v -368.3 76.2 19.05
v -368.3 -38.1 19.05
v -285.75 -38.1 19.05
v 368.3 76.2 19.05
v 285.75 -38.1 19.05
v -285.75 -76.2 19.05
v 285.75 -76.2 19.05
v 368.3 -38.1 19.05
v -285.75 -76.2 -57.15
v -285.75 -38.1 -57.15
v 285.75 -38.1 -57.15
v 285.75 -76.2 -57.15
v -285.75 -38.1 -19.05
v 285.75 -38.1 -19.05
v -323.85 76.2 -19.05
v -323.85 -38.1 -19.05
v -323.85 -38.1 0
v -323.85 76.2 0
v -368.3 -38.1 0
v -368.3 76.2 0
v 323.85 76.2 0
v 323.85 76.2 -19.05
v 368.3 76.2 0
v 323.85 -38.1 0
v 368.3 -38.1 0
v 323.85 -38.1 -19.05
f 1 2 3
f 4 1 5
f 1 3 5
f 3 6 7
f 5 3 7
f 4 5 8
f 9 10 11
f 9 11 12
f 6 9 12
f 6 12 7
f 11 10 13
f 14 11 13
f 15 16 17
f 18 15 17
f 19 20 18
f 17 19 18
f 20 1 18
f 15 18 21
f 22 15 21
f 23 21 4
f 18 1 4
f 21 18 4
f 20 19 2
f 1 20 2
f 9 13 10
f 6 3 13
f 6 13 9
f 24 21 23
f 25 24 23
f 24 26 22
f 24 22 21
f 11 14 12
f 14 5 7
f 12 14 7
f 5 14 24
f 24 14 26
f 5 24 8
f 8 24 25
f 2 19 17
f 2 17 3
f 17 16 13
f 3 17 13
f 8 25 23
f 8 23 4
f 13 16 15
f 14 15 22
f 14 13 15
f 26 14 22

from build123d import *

# Parameters (mm, degrees)
F0_W     = 736.6
F0_H     = 38.1
F1_DEPTH = 76.2
F2_W     = 44.45
F2_H     = 19.05
F3_DEPTH = 152.401
F4_W     = 44.45
F4_H     = 38.1
F4_W_2   = 38.1
F5_DEPTH = 38.101
F6_W     = 38.1
F6_H     = 38.1
F7_DEPTH = 571.5


with BuildPart() as f1:
    # F0 (on Front) → F1 (new body, symmetric)
    with BuildSketch(Plane.XZ):
        Rectangle(F0_W, F0_H)
    extrude(amount=F1_DEPTH, both=True)

    # F2 (on face) → F3 (cut, through all)
    with BuildSketch(Plane.XZ.offset(76.2)):
        with Locations((-346.075, -9.525)):
            Rectangle(F2_W, F2_H)
        with Locations((346.075, -9.525)):
            Rectangle(F2_W, F2_H)
    extrude(amount=-F3_DEPTH, mode=Mode.SUBTRACT)

    # F4 (on face) → F5 (cut, through all)
    with BuildSketch(Plane(origin=(0, 0, -19.05), x_dir=(1, 0, 0), z_dir=(0, 0, -1))):
        with Locations((-346.075, 57.15)):
            Rectangle(F4_W, F4_H)
        with Locations((-304.8, 57.15)):
            Rectangle(F4_W_2, F4_H)
        with Locations((304.8, 57.15)):
            Rectangle(F4_W_2, F4_H)
        with Locations((346.075, 57.15)):
            Rectangle(F4_W, F4_H)
    extrude(amount=-F5_DEPTH, mode=Mode.SUBTRACT)

    # F6 (on face) → F7 (join, through all)
    with BuildSketch(Plane(origin=(-285.75, 0, 0), x_dir=(0, -1, 0), z_dir=(-1, 0, 0))):
        with Locations((57.15, -38.1)):
            Rectangle(F6_W, F6_H)
    extrude(amount=-F7_DEPTH)


solid = f1.part
